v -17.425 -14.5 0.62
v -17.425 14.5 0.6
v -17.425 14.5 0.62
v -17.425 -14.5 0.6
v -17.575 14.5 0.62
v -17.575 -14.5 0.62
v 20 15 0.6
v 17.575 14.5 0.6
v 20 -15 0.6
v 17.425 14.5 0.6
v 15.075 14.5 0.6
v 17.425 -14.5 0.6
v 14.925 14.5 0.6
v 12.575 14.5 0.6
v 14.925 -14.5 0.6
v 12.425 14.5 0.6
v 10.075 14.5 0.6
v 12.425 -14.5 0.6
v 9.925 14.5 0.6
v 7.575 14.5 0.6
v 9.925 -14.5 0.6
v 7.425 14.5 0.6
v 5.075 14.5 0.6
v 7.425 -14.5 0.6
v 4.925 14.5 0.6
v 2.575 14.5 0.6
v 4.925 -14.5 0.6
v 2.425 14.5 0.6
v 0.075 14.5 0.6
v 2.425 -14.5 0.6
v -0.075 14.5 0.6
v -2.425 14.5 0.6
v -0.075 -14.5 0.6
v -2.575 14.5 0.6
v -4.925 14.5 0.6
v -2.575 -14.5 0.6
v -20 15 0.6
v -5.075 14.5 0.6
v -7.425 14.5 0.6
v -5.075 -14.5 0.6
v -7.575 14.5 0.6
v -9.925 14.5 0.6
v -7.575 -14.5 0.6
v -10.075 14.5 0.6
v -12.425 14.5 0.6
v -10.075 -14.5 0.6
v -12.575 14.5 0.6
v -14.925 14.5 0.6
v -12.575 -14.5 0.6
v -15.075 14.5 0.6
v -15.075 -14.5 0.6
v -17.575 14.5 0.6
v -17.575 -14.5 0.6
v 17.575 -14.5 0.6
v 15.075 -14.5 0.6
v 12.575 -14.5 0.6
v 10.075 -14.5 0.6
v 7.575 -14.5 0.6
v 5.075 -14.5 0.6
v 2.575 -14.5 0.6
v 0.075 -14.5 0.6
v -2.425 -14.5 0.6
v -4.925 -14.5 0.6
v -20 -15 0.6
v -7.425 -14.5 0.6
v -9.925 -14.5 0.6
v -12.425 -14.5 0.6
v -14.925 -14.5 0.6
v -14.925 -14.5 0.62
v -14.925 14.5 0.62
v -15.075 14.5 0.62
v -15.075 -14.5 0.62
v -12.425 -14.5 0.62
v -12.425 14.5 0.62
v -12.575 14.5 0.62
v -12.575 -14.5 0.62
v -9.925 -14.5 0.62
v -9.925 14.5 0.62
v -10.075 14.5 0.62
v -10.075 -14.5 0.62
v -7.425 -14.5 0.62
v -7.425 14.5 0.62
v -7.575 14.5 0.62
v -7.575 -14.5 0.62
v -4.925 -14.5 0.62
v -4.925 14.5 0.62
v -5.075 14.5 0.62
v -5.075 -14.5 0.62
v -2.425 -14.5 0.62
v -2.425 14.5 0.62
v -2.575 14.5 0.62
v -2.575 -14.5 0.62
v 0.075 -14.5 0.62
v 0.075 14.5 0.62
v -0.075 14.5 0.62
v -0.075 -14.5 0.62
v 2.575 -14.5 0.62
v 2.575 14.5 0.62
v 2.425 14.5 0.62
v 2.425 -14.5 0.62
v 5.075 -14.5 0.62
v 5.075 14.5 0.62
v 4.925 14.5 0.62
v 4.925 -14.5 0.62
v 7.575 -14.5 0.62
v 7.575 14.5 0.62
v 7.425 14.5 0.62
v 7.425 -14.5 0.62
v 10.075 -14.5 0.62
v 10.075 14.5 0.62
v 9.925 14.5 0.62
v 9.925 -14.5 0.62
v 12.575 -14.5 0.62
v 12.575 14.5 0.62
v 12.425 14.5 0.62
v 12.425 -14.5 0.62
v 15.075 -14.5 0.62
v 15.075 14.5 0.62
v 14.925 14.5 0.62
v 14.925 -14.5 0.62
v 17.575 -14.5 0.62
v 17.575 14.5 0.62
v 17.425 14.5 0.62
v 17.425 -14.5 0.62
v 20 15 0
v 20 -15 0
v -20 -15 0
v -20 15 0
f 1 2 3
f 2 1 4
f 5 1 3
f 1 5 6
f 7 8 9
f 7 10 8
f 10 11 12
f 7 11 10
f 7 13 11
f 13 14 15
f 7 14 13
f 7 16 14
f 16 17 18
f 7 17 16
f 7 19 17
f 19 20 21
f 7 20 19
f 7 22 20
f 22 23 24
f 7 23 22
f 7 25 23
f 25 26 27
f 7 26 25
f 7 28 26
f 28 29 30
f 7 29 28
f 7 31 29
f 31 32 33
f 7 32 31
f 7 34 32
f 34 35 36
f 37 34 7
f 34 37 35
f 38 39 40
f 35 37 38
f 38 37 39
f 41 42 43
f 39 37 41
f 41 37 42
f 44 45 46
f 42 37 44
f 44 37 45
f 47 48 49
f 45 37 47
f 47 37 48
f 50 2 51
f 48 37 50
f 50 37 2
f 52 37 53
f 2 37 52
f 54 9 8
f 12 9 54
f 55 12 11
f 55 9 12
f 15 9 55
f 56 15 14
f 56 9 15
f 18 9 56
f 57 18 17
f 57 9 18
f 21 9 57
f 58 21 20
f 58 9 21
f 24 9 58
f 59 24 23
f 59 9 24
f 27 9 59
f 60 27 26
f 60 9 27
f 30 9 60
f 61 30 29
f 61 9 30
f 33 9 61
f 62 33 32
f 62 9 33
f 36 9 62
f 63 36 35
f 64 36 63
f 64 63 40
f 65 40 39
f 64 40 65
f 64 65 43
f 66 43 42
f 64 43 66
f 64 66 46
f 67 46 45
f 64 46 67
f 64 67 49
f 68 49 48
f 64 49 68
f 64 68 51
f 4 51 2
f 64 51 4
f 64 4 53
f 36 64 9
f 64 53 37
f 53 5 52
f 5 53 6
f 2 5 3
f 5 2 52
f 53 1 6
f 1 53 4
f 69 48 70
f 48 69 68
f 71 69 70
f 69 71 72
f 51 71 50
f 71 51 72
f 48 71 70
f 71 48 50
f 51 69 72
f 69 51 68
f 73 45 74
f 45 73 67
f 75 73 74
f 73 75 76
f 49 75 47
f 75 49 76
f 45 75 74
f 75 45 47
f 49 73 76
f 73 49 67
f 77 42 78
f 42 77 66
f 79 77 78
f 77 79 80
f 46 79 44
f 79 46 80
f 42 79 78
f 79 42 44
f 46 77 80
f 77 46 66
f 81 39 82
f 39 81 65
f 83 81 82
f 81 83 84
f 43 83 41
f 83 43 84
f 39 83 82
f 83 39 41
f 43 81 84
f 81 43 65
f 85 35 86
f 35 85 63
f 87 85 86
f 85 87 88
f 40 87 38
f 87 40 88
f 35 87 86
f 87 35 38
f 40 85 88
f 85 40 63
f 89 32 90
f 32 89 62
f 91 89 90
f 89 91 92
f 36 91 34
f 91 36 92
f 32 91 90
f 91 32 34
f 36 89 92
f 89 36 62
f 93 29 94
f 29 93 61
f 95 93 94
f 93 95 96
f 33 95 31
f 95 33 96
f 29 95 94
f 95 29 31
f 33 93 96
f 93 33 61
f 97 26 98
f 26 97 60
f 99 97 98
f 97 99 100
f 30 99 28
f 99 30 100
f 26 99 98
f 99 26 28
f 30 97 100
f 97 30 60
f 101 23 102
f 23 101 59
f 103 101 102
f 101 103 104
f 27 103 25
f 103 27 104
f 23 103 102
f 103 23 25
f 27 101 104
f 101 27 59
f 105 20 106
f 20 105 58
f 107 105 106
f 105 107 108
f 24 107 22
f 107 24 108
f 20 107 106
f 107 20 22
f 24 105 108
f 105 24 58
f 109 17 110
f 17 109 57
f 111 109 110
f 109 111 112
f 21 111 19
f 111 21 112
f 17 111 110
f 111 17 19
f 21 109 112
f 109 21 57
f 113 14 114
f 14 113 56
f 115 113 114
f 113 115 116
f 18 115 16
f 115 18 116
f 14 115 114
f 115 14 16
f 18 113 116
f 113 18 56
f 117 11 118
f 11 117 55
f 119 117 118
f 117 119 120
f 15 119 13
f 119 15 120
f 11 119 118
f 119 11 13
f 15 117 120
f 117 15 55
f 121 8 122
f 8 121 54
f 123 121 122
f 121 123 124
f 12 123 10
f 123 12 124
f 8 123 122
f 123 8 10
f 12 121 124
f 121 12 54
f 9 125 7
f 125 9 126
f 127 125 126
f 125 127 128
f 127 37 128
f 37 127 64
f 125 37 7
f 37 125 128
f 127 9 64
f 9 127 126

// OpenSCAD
// Parking lot — flat asphalt pad with painted stall stripes. Background
// for the dynamic car batch which draws individual vehicles on top
// based on the building's CurrentCars count, so the visible "fullness"
// of the lot scales with skier arrivals/departures.
//
// Stripe pitch is aligned with the renderer's per-car stall pitch (2.5 m
// along +X) so painted lanes line up with where cars actually sit. Car
// rows extend along +Y (a car's long axis is +Y in SCAD = game Z).
//
// Conventions, units, and axis docs: see models-src/README.md.
//
//   +X = stall-width direction (stalls repeat along this axis)
//   +Y = stall-length direction (a car is parked along this axis)
//   +Z = up

$fn = 8;

// ── Dimensions (metres) ────────────────────────────────────────────────
pad_w = 40.0; // along +X — total width of the lot (16 × 2.5 m stalls)
pad_d = 30.0; // along +Y — total depth (≈6 rows × 5 m)
pad_h = 0.60; // graded earthwork pad — thicker than asphalt alone (≈15 cm)
              // because the visible slab also stands in for the built-up
              // dirt base under it. A thin slab reads as a sheet of
              // colour and visually merges with the surrounding apron
              // snow at oblique camera angles.

stall_pitch  = 2.5;  // distance between adjacent stall stripes (matches renderer)
stripe_width = 0.15; // metres — a hair wider than reality so it reads at game scale
stripe_inset = 0.5;  // metres pulled in from the pad's +Y / −Y edges
stripe_z     = pad_h + 0.01; // sits just above the asphalt to dodge z-fighting

// ── Geometry ───────────────────────────────────────────────────────────
module pad() {
    // Dark asphalt slab centred on the origin. Slightly raised so it
    // reads as a built-up earthwork pad rather than melting into the snow.
    color([0.20, 0.20, 0.22])
        translate([0, 0, pad_h / 2])
            cube([pad_w, pad_d, pad_h], center = true);
}

// One white stripe centred at x, running along +Y with a small inset
// from each end so the perimeter looks tidy.
module stripe(x) {
    stripe_len = pad_d - 2 * stripe_inset;
    color([0.92, 0.92, 0.92])
        translate([x, 0, stripe_z])
            cube([stripe_width, stripe_len, 0.02], center = true);
}

// Interior stripes only — between each pair of stalls. n_stalls is the
// number of stall columns; we draw (n_stalls − 1) stripes between them
// and skip the outer perimeter so the lot reads "edged by the pad", not
// "lined like a checkerboard".
module stripes() {
    n_stalls = floor(pad_w / stall_pitch);
    for (i = [1 : n_stalls - 1])
        stripe(-pad_w / 2 + i * stall_pitch);
}

module parking_lot() {
    pad();
    stripes();
}

parking_lot();

// ── Footprint metadata ─────────────────────────────────────────────────
// Half-extents in SCAD coords (X, Y). The scad2obj converter applies the
// SCAD → game rotation and writes the canonical (halfX, halfZ) into the
// OBJ header for the placement pass and the per-car layout.
echo("MOGUL_META", "footprint", pad_w / 2, pad_d / 2);
